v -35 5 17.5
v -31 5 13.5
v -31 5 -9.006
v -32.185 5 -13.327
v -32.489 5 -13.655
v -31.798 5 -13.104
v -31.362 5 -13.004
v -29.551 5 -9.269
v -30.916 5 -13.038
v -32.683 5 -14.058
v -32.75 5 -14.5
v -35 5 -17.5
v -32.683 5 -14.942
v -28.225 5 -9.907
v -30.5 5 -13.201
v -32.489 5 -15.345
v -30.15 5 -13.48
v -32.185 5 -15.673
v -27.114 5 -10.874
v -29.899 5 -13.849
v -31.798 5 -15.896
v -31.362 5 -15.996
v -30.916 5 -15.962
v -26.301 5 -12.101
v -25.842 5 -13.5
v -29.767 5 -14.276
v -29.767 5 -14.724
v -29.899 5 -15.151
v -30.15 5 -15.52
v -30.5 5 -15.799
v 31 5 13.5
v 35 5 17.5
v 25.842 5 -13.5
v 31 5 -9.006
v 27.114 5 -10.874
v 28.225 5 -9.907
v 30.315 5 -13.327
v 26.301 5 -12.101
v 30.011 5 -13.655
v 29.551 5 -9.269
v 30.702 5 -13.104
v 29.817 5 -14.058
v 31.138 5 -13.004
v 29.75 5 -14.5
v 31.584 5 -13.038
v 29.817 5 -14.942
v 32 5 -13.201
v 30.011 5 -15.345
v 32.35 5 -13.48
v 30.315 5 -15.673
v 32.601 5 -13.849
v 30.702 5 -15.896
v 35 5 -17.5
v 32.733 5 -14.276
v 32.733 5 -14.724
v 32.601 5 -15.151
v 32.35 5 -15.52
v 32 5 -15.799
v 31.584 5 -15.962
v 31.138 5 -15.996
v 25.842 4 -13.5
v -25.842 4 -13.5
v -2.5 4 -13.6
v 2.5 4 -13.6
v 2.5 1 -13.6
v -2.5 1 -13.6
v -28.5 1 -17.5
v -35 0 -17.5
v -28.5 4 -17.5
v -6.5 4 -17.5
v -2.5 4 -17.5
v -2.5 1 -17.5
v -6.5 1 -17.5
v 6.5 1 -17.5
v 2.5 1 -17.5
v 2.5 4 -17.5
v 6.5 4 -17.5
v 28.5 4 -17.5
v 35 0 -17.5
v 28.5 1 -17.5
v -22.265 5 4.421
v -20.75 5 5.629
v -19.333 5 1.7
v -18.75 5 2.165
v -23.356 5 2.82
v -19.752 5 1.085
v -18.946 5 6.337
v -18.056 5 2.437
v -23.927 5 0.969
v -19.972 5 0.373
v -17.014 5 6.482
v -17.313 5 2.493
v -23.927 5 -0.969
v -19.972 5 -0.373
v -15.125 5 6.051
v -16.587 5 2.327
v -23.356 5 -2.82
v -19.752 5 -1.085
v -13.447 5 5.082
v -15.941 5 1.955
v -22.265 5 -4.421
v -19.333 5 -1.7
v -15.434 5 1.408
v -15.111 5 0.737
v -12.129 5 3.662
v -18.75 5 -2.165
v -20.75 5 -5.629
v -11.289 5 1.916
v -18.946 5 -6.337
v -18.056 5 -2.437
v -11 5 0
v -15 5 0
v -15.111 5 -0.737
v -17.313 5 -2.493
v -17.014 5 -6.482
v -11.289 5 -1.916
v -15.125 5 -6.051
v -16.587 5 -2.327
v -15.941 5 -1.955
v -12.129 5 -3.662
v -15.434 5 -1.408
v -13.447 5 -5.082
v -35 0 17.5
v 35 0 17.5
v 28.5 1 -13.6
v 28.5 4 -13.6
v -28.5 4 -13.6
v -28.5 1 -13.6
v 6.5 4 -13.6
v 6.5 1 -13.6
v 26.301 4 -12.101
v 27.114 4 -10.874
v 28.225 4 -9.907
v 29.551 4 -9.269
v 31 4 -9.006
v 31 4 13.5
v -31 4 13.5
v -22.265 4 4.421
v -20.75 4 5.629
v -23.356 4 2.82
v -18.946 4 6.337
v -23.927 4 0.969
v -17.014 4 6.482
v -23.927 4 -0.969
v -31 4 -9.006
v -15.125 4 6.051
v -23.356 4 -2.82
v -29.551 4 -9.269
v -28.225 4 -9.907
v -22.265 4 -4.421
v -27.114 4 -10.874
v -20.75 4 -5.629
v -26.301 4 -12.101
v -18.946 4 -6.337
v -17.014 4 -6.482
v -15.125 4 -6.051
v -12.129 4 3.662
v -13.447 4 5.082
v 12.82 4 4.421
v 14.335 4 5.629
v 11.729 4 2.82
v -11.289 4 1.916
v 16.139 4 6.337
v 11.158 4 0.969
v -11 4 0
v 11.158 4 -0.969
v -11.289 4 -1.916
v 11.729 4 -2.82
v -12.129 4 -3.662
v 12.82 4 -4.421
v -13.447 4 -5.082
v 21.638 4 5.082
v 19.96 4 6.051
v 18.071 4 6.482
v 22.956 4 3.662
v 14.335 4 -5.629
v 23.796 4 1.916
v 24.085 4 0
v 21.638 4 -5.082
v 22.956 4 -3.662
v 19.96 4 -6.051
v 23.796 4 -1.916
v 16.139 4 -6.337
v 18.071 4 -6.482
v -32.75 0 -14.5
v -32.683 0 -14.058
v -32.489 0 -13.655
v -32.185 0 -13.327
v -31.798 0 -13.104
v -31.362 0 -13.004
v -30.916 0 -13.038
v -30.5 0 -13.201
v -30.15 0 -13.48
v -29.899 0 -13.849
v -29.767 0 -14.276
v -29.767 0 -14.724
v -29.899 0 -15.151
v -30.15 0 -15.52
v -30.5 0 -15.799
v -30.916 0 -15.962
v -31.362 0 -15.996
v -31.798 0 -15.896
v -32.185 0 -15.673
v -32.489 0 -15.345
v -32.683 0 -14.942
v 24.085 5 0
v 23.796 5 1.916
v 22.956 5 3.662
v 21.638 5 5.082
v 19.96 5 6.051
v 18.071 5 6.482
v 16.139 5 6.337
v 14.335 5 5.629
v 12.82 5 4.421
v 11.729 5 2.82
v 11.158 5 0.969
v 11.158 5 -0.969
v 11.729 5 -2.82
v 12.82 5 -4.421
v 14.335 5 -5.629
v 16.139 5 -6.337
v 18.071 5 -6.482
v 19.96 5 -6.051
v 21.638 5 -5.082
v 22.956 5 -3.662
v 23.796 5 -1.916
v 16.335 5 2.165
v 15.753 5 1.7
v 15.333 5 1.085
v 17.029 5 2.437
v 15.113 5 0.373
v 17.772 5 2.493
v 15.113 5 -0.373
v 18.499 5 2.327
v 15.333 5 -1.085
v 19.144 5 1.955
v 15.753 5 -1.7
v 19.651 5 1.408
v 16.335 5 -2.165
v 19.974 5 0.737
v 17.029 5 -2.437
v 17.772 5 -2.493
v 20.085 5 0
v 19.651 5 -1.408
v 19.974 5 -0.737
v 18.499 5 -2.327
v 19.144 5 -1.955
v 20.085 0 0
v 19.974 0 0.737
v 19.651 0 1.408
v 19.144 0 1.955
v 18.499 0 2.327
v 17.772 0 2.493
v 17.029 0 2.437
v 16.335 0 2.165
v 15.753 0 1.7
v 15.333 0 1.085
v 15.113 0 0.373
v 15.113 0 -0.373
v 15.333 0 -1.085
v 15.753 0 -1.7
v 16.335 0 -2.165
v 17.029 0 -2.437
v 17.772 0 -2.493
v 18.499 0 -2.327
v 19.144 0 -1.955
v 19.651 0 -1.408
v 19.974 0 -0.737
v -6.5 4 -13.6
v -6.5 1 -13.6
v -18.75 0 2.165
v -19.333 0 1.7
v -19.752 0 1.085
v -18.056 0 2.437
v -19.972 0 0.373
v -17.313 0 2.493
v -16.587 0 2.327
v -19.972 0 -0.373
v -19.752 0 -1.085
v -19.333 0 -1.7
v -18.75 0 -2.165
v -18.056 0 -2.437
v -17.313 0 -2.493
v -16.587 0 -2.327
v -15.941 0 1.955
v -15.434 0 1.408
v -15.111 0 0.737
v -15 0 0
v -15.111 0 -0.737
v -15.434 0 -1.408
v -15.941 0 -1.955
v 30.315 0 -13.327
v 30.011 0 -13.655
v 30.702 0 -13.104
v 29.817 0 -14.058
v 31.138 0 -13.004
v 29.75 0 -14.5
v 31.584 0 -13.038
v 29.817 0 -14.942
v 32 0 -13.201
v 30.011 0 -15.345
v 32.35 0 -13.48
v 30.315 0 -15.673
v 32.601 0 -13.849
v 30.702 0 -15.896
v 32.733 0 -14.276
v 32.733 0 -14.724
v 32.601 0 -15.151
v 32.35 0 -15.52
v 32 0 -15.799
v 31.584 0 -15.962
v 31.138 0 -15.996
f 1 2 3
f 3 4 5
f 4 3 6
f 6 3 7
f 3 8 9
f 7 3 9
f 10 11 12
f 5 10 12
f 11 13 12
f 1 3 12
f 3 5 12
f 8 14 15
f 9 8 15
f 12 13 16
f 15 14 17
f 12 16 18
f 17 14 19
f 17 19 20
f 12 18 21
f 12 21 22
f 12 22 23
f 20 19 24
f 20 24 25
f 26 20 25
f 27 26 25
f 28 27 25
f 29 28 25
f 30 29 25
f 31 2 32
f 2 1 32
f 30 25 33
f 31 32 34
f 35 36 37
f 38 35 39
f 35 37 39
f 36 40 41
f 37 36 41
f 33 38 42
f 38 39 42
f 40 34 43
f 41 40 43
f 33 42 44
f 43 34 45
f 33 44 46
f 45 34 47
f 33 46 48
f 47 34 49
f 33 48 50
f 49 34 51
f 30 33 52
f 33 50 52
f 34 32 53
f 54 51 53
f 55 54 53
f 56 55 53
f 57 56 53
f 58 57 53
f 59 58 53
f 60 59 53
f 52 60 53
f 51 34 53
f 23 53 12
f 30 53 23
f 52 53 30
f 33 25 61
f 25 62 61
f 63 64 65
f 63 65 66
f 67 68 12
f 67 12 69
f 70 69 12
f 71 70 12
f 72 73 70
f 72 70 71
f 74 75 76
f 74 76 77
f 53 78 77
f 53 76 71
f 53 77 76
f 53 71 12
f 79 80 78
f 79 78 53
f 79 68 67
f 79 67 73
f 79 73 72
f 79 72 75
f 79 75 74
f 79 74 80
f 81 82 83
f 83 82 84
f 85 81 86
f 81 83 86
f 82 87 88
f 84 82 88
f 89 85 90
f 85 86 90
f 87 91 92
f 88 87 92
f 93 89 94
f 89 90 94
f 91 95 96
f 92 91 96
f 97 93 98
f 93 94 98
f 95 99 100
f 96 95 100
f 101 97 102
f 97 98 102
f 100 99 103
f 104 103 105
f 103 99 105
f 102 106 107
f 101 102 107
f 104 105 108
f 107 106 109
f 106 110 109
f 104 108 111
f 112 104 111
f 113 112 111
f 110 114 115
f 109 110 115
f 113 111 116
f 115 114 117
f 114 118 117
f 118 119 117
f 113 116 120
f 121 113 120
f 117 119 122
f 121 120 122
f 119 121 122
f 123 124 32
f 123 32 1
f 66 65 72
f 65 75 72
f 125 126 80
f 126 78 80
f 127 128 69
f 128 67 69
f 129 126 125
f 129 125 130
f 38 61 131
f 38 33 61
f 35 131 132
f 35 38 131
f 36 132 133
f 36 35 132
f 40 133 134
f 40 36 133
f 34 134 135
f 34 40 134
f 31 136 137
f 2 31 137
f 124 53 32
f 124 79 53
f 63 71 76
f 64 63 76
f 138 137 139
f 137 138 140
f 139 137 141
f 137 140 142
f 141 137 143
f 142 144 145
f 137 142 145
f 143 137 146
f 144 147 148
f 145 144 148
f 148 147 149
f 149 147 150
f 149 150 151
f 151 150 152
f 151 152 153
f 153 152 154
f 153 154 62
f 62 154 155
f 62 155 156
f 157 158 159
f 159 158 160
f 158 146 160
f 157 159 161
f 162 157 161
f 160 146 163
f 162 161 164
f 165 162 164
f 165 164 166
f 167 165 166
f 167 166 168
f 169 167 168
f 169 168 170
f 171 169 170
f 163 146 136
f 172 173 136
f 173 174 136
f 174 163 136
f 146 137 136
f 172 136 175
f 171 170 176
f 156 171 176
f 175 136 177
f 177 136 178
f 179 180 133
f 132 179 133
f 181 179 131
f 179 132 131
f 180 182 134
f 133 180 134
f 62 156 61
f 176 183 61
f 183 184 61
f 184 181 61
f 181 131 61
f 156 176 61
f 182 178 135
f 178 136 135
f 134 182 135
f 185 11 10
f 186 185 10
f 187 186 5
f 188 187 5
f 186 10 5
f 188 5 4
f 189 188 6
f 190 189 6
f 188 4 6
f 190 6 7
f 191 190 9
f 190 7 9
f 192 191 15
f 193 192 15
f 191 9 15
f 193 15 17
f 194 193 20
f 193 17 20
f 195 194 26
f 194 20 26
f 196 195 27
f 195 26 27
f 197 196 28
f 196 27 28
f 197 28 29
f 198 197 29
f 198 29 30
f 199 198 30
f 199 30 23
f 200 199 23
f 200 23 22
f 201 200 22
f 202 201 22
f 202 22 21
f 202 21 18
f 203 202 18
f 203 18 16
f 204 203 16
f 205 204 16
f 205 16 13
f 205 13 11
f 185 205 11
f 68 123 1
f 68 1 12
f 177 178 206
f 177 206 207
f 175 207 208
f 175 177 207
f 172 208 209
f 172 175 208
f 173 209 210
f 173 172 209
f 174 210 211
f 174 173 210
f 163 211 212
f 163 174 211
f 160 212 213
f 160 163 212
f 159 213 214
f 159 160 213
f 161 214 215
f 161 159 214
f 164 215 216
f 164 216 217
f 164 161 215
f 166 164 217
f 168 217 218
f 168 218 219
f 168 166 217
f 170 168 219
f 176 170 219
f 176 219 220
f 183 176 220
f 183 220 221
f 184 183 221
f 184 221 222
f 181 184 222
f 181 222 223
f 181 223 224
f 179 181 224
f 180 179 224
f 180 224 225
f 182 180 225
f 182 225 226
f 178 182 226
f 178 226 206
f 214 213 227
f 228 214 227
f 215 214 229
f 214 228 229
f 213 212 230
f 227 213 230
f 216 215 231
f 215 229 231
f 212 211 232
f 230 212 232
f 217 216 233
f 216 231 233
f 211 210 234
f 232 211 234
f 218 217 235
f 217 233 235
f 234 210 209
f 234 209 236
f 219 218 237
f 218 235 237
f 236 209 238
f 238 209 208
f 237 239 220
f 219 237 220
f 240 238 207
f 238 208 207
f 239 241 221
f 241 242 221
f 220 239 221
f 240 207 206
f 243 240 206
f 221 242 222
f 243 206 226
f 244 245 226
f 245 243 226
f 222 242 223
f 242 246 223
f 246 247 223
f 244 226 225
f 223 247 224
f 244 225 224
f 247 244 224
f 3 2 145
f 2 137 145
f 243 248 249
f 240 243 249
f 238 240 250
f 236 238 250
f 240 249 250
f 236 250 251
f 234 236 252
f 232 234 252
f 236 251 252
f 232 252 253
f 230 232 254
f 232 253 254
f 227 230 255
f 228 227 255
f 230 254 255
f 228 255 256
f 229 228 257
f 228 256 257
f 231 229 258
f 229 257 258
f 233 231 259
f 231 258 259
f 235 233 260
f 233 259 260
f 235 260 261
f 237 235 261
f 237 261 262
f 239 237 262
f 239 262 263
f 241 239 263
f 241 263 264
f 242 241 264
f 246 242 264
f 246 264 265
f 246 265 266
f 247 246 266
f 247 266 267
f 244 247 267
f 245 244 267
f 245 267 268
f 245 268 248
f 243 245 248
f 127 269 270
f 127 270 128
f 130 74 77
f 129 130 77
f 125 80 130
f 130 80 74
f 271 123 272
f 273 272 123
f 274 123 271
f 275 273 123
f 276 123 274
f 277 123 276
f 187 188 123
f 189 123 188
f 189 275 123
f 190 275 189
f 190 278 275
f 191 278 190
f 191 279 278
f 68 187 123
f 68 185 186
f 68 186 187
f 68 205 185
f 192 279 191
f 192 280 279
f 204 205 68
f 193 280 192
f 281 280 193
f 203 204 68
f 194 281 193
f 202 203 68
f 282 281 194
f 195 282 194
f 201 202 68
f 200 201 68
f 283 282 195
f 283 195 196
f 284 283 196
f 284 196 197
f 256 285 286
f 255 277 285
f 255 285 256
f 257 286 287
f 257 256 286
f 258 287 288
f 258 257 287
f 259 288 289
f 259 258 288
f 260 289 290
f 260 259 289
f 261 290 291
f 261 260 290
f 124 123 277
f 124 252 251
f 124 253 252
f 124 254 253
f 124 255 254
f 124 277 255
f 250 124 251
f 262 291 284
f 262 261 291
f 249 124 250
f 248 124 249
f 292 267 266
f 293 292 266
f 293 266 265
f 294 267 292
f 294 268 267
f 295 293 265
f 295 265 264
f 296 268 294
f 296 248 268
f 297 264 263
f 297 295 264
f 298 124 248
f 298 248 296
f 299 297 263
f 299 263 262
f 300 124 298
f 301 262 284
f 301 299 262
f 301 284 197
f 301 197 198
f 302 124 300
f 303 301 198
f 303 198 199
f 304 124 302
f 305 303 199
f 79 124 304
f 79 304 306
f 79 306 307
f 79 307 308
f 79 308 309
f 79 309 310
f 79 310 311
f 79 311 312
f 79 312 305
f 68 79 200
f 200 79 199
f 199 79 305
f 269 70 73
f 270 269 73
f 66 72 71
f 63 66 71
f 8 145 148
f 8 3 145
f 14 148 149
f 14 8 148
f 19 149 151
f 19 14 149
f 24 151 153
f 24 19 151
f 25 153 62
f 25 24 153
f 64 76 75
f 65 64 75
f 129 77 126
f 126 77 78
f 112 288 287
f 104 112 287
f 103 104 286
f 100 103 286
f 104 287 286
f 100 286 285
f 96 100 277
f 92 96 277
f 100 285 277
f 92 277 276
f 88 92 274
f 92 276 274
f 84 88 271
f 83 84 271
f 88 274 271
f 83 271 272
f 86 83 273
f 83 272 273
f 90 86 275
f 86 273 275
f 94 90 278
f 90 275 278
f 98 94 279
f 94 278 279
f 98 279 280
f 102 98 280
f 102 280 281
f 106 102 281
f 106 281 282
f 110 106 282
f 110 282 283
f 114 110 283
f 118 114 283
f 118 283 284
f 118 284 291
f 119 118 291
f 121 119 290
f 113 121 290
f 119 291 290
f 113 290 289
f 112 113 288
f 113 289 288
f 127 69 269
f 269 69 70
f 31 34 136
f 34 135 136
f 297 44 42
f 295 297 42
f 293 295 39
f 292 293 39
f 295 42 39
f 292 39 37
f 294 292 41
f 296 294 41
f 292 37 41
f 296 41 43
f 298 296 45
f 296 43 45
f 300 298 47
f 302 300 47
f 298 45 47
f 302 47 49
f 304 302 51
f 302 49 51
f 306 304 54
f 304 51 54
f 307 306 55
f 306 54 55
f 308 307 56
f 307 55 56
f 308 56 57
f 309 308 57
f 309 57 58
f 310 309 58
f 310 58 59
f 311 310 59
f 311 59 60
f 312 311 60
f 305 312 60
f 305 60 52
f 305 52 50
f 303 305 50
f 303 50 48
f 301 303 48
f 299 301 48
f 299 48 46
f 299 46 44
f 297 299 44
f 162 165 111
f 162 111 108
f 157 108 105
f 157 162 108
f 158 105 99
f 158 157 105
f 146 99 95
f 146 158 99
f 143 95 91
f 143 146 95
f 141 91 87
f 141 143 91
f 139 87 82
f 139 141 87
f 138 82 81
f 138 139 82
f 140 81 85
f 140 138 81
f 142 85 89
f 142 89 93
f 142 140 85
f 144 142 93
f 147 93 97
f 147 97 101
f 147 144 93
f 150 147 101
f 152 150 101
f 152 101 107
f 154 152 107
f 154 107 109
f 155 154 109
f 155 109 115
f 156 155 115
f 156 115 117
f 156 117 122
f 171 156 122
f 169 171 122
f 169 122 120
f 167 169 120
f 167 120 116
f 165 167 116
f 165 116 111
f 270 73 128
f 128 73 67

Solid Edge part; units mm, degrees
sketch "Sketch1" plane through (0, 0, 0) normal (0, -1, 0) x (1, 0, 0)
  line L0 (35, 17.5) -> (-35, 17.5)
  line L1 (-35, 17.5) -> (-35, -17.5)
  line L2 (-35, -17.5) -> (35, -17.5)
  line L3 (35, -17.5) -> (35, 17.5)
extrude "Protrusion1" add sketch "Sketch1" against normal blind 5
sketch "Sketch2" plane through (0, 0, 0) normal (0, -1, 0) x (1, 0, 0)
  circle A0 centre (17.5852, 0) radius 2.5
extrude "ExtrudedCutout_1" cut sketch "Sketch2" against normal blind 7
sketch "Sketch3" plane through (0, 0, 0) normal (0, -1, 0) x (1, 0, 0)
  circle A0 centre (-17.5, 0) radius 2.5
extrude "ExtrudedCutout_2" cut sketch "Sketch3" against normal blind 7
sketch "Sketch4" plane through (0, 5, 0) normal (0, 1, 0) x (-1, 0, 0)
  circle A0 centre (-31.25, -14.5) radius 1.5
extrude "ExtrudedCutout_10" cut sketch "Sketch4" against normal blind 7
sketch "Sketch5" plane through (0, 5, 0) normal (0, 1, 0) x (-1, 0, 0)
  circle A0 centre (31.25, -14.5) radius 1.5
extrude "ExtrudedCutout_11" cut sketch "Sketch5" against normal blind 7
shell "Thinwall_4" thickness 4 removed faces 1 at (-22.6333, 5, 12.0167)
sketch "Sketch6" plane through (0, 2.5, -17.5) normal (0, 0, -1) x (-1, 0, 0)
  line L0 (-6.5, 1.5) -> (-28.5, 1.5)
  line L1 (-28.5, 1.5) -> (-28.5, -1.5)
  line L2 (-28.5, -1.5) -> (-6.5, -1.5)
  line L3 (-6.5, -1.5) -> (-6.5, 1.5)
extrude "ExtrudedCutout_13" cut sketch "Sketch6" against normal blind 3.9
sketch "Sketch7" plane through (0, 2.5, -17.5) normal (0, 0, -1) x (-1, 0, 0)
  line L0 (2.5, 1.5) -> (-2.5, 1.5)
  line L1 (-2.5, 1.5) -> (-2.5, -1.5)
  line L2 (-2.5, -1.5) -> (2.5, -1.5)
  line L3 (2.5, -1.5) -> (2.5, 1.5)
extrude "ExtrudedCutout_14" cut sketch "Sketch7" against normal blind 3.9
sketch "Sketch8" plane through (0, 2.5, -17.5) normal (0, 0, -1) x (-1, 0, 0)
  line L0 (28.5, 1.5) -> (6.5, 1.5)
  line L1 (6.5, 1.5) -> (6.5, -1.5)
  line L2 (6.5, -1.5) -> (28.5, -1.5)
  line L3 (28.5, -1.5) -> (28.5, 1.5)
extrude "ExtrudedCutout_15" cut sketch "Sketch8" against normal blind 3.9
